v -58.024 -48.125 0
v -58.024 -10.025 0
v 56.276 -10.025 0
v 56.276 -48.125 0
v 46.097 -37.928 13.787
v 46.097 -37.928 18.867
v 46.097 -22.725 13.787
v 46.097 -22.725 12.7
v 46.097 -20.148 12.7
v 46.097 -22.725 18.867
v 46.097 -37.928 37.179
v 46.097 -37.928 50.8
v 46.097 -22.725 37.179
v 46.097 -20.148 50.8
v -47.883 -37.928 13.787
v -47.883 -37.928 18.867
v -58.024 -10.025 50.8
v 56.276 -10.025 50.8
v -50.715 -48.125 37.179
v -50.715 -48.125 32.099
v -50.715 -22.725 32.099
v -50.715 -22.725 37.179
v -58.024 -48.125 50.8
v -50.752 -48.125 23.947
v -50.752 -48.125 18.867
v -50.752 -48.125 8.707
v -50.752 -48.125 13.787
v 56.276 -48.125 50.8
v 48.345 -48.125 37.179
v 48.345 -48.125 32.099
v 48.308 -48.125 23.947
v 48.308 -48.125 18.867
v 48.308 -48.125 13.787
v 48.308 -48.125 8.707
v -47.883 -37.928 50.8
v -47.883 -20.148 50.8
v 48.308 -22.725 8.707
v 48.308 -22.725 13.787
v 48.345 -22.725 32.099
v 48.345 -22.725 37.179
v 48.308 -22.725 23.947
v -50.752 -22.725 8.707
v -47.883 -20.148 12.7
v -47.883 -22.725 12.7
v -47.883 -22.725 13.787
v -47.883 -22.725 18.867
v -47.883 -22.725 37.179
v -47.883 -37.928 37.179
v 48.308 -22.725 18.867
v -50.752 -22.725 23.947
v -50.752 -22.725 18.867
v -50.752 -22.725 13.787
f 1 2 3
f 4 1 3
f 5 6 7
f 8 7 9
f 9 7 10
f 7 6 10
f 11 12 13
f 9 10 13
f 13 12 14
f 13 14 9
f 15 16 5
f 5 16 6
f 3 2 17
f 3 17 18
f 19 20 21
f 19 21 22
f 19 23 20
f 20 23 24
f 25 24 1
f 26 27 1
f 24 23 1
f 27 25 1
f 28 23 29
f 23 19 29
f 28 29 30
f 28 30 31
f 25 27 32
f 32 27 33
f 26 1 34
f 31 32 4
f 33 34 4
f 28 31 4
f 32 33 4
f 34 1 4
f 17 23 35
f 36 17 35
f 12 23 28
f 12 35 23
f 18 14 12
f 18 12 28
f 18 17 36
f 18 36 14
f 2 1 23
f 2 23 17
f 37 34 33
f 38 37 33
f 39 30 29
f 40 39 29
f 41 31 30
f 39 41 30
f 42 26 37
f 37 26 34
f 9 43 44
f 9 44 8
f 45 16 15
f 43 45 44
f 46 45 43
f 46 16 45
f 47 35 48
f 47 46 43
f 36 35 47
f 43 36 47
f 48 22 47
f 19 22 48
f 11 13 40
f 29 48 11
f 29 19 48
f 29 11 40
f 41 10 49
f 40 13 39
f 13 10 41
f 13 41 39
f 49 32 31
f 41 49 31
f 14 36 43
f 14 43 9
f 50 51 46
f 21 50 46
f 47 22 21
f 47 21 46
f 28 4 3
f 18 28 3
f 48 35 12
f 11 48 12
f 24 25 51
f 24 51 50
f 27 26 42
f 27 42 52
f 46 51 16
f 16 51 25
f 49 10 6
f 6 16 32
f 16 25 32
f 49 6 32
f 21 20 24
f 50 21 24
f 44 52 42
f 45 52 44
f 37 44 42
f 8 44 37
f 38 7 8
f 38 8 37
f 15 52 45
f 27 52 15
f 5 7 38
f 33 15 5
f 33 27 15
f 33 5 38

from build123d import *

# Parameters (mm, degrees)
F0_W     = 114.3
F0_H     = 38.1
F1_DEPTH = 50.8
F2_W     = 93.98
F2_H     = 17.78
F3_DEPTH = 38.1
F4_W     = 99.06
F4_H     = 5.08
F5_DEPTH = 25.4
F6_DEPTH = 25.4


# Not quite as in the source:
# - a feature names something its author has since deleted; it is built from what else it names


with BuildPart() as f1:
    # F0 (on Top) → F1 (new body)
    with BuildSketch(Plane.XY):
        with Locations((-0.8744271472, -29.0754930802)):
            Rectangle(F0_W, F0_H)
    extrude(amount=F1_DEPTH)

    # F2 (on face) → F3 (cut)
    with BuildSketch(Plane.XY.offset(50.8)):
        with Locations((-0.8926133716, -29.0383800721)):
            Rectangle(F2_W, F2_H)
    extrude(amount=-F3_DEPTH, mode=Mode.SUBTRACT)

    # F4 (on face) → F5 (cut)
    with BuildSketch(Plane.XZ.offset(48.1254930802)):
        with Locations((-1.2216676867, 11.2467280274)):
            Rectangle(F4_W, F4_H)
        Polygon((-50.7150366902, 32.0992726219), (-50.7516676867, 23.9467280274), (48.3083323133, 23.9467280274), (48.3449633098, 32.0992726219), align=None)
        with Locations((-1.2216676867, 21.4067280274)):
            Rectangle(F4_W, F4_H)
        with Locations((-1.1850366902, 34.6392726219)):
            Rectangle(F4_W, F4_H)
    extrude(amount=-F5_DEPTH, mode=Mode.SUBTRACT)

    # F4 (on face) → F6 (cut)
    with BuildSketch(Plane.XZ.offset(48.1254930802)):
        with Locations((-1.2216676867, 11.2467280274)):
            Rectangle(F4_W, F4_H)
        Polygon((-50.7150366902, 32.0992726219), (-50.7516676867, 23.9467280274), (48.3083323133, 23.9467280274), (48.3449633098, 32.0992726219), align=None)
        with Locations((-1.2216676867, 21.4067280274)):
            Rectangle(F4_W, F4_H)
        with Locations((-1.1850366902, 34.6392726219)):
            Rectangle(F4_W, F4_H)
    extrude(amount=-F6_DEPTH, mode=Mode.SUBTRACT)


solid = f1.part
